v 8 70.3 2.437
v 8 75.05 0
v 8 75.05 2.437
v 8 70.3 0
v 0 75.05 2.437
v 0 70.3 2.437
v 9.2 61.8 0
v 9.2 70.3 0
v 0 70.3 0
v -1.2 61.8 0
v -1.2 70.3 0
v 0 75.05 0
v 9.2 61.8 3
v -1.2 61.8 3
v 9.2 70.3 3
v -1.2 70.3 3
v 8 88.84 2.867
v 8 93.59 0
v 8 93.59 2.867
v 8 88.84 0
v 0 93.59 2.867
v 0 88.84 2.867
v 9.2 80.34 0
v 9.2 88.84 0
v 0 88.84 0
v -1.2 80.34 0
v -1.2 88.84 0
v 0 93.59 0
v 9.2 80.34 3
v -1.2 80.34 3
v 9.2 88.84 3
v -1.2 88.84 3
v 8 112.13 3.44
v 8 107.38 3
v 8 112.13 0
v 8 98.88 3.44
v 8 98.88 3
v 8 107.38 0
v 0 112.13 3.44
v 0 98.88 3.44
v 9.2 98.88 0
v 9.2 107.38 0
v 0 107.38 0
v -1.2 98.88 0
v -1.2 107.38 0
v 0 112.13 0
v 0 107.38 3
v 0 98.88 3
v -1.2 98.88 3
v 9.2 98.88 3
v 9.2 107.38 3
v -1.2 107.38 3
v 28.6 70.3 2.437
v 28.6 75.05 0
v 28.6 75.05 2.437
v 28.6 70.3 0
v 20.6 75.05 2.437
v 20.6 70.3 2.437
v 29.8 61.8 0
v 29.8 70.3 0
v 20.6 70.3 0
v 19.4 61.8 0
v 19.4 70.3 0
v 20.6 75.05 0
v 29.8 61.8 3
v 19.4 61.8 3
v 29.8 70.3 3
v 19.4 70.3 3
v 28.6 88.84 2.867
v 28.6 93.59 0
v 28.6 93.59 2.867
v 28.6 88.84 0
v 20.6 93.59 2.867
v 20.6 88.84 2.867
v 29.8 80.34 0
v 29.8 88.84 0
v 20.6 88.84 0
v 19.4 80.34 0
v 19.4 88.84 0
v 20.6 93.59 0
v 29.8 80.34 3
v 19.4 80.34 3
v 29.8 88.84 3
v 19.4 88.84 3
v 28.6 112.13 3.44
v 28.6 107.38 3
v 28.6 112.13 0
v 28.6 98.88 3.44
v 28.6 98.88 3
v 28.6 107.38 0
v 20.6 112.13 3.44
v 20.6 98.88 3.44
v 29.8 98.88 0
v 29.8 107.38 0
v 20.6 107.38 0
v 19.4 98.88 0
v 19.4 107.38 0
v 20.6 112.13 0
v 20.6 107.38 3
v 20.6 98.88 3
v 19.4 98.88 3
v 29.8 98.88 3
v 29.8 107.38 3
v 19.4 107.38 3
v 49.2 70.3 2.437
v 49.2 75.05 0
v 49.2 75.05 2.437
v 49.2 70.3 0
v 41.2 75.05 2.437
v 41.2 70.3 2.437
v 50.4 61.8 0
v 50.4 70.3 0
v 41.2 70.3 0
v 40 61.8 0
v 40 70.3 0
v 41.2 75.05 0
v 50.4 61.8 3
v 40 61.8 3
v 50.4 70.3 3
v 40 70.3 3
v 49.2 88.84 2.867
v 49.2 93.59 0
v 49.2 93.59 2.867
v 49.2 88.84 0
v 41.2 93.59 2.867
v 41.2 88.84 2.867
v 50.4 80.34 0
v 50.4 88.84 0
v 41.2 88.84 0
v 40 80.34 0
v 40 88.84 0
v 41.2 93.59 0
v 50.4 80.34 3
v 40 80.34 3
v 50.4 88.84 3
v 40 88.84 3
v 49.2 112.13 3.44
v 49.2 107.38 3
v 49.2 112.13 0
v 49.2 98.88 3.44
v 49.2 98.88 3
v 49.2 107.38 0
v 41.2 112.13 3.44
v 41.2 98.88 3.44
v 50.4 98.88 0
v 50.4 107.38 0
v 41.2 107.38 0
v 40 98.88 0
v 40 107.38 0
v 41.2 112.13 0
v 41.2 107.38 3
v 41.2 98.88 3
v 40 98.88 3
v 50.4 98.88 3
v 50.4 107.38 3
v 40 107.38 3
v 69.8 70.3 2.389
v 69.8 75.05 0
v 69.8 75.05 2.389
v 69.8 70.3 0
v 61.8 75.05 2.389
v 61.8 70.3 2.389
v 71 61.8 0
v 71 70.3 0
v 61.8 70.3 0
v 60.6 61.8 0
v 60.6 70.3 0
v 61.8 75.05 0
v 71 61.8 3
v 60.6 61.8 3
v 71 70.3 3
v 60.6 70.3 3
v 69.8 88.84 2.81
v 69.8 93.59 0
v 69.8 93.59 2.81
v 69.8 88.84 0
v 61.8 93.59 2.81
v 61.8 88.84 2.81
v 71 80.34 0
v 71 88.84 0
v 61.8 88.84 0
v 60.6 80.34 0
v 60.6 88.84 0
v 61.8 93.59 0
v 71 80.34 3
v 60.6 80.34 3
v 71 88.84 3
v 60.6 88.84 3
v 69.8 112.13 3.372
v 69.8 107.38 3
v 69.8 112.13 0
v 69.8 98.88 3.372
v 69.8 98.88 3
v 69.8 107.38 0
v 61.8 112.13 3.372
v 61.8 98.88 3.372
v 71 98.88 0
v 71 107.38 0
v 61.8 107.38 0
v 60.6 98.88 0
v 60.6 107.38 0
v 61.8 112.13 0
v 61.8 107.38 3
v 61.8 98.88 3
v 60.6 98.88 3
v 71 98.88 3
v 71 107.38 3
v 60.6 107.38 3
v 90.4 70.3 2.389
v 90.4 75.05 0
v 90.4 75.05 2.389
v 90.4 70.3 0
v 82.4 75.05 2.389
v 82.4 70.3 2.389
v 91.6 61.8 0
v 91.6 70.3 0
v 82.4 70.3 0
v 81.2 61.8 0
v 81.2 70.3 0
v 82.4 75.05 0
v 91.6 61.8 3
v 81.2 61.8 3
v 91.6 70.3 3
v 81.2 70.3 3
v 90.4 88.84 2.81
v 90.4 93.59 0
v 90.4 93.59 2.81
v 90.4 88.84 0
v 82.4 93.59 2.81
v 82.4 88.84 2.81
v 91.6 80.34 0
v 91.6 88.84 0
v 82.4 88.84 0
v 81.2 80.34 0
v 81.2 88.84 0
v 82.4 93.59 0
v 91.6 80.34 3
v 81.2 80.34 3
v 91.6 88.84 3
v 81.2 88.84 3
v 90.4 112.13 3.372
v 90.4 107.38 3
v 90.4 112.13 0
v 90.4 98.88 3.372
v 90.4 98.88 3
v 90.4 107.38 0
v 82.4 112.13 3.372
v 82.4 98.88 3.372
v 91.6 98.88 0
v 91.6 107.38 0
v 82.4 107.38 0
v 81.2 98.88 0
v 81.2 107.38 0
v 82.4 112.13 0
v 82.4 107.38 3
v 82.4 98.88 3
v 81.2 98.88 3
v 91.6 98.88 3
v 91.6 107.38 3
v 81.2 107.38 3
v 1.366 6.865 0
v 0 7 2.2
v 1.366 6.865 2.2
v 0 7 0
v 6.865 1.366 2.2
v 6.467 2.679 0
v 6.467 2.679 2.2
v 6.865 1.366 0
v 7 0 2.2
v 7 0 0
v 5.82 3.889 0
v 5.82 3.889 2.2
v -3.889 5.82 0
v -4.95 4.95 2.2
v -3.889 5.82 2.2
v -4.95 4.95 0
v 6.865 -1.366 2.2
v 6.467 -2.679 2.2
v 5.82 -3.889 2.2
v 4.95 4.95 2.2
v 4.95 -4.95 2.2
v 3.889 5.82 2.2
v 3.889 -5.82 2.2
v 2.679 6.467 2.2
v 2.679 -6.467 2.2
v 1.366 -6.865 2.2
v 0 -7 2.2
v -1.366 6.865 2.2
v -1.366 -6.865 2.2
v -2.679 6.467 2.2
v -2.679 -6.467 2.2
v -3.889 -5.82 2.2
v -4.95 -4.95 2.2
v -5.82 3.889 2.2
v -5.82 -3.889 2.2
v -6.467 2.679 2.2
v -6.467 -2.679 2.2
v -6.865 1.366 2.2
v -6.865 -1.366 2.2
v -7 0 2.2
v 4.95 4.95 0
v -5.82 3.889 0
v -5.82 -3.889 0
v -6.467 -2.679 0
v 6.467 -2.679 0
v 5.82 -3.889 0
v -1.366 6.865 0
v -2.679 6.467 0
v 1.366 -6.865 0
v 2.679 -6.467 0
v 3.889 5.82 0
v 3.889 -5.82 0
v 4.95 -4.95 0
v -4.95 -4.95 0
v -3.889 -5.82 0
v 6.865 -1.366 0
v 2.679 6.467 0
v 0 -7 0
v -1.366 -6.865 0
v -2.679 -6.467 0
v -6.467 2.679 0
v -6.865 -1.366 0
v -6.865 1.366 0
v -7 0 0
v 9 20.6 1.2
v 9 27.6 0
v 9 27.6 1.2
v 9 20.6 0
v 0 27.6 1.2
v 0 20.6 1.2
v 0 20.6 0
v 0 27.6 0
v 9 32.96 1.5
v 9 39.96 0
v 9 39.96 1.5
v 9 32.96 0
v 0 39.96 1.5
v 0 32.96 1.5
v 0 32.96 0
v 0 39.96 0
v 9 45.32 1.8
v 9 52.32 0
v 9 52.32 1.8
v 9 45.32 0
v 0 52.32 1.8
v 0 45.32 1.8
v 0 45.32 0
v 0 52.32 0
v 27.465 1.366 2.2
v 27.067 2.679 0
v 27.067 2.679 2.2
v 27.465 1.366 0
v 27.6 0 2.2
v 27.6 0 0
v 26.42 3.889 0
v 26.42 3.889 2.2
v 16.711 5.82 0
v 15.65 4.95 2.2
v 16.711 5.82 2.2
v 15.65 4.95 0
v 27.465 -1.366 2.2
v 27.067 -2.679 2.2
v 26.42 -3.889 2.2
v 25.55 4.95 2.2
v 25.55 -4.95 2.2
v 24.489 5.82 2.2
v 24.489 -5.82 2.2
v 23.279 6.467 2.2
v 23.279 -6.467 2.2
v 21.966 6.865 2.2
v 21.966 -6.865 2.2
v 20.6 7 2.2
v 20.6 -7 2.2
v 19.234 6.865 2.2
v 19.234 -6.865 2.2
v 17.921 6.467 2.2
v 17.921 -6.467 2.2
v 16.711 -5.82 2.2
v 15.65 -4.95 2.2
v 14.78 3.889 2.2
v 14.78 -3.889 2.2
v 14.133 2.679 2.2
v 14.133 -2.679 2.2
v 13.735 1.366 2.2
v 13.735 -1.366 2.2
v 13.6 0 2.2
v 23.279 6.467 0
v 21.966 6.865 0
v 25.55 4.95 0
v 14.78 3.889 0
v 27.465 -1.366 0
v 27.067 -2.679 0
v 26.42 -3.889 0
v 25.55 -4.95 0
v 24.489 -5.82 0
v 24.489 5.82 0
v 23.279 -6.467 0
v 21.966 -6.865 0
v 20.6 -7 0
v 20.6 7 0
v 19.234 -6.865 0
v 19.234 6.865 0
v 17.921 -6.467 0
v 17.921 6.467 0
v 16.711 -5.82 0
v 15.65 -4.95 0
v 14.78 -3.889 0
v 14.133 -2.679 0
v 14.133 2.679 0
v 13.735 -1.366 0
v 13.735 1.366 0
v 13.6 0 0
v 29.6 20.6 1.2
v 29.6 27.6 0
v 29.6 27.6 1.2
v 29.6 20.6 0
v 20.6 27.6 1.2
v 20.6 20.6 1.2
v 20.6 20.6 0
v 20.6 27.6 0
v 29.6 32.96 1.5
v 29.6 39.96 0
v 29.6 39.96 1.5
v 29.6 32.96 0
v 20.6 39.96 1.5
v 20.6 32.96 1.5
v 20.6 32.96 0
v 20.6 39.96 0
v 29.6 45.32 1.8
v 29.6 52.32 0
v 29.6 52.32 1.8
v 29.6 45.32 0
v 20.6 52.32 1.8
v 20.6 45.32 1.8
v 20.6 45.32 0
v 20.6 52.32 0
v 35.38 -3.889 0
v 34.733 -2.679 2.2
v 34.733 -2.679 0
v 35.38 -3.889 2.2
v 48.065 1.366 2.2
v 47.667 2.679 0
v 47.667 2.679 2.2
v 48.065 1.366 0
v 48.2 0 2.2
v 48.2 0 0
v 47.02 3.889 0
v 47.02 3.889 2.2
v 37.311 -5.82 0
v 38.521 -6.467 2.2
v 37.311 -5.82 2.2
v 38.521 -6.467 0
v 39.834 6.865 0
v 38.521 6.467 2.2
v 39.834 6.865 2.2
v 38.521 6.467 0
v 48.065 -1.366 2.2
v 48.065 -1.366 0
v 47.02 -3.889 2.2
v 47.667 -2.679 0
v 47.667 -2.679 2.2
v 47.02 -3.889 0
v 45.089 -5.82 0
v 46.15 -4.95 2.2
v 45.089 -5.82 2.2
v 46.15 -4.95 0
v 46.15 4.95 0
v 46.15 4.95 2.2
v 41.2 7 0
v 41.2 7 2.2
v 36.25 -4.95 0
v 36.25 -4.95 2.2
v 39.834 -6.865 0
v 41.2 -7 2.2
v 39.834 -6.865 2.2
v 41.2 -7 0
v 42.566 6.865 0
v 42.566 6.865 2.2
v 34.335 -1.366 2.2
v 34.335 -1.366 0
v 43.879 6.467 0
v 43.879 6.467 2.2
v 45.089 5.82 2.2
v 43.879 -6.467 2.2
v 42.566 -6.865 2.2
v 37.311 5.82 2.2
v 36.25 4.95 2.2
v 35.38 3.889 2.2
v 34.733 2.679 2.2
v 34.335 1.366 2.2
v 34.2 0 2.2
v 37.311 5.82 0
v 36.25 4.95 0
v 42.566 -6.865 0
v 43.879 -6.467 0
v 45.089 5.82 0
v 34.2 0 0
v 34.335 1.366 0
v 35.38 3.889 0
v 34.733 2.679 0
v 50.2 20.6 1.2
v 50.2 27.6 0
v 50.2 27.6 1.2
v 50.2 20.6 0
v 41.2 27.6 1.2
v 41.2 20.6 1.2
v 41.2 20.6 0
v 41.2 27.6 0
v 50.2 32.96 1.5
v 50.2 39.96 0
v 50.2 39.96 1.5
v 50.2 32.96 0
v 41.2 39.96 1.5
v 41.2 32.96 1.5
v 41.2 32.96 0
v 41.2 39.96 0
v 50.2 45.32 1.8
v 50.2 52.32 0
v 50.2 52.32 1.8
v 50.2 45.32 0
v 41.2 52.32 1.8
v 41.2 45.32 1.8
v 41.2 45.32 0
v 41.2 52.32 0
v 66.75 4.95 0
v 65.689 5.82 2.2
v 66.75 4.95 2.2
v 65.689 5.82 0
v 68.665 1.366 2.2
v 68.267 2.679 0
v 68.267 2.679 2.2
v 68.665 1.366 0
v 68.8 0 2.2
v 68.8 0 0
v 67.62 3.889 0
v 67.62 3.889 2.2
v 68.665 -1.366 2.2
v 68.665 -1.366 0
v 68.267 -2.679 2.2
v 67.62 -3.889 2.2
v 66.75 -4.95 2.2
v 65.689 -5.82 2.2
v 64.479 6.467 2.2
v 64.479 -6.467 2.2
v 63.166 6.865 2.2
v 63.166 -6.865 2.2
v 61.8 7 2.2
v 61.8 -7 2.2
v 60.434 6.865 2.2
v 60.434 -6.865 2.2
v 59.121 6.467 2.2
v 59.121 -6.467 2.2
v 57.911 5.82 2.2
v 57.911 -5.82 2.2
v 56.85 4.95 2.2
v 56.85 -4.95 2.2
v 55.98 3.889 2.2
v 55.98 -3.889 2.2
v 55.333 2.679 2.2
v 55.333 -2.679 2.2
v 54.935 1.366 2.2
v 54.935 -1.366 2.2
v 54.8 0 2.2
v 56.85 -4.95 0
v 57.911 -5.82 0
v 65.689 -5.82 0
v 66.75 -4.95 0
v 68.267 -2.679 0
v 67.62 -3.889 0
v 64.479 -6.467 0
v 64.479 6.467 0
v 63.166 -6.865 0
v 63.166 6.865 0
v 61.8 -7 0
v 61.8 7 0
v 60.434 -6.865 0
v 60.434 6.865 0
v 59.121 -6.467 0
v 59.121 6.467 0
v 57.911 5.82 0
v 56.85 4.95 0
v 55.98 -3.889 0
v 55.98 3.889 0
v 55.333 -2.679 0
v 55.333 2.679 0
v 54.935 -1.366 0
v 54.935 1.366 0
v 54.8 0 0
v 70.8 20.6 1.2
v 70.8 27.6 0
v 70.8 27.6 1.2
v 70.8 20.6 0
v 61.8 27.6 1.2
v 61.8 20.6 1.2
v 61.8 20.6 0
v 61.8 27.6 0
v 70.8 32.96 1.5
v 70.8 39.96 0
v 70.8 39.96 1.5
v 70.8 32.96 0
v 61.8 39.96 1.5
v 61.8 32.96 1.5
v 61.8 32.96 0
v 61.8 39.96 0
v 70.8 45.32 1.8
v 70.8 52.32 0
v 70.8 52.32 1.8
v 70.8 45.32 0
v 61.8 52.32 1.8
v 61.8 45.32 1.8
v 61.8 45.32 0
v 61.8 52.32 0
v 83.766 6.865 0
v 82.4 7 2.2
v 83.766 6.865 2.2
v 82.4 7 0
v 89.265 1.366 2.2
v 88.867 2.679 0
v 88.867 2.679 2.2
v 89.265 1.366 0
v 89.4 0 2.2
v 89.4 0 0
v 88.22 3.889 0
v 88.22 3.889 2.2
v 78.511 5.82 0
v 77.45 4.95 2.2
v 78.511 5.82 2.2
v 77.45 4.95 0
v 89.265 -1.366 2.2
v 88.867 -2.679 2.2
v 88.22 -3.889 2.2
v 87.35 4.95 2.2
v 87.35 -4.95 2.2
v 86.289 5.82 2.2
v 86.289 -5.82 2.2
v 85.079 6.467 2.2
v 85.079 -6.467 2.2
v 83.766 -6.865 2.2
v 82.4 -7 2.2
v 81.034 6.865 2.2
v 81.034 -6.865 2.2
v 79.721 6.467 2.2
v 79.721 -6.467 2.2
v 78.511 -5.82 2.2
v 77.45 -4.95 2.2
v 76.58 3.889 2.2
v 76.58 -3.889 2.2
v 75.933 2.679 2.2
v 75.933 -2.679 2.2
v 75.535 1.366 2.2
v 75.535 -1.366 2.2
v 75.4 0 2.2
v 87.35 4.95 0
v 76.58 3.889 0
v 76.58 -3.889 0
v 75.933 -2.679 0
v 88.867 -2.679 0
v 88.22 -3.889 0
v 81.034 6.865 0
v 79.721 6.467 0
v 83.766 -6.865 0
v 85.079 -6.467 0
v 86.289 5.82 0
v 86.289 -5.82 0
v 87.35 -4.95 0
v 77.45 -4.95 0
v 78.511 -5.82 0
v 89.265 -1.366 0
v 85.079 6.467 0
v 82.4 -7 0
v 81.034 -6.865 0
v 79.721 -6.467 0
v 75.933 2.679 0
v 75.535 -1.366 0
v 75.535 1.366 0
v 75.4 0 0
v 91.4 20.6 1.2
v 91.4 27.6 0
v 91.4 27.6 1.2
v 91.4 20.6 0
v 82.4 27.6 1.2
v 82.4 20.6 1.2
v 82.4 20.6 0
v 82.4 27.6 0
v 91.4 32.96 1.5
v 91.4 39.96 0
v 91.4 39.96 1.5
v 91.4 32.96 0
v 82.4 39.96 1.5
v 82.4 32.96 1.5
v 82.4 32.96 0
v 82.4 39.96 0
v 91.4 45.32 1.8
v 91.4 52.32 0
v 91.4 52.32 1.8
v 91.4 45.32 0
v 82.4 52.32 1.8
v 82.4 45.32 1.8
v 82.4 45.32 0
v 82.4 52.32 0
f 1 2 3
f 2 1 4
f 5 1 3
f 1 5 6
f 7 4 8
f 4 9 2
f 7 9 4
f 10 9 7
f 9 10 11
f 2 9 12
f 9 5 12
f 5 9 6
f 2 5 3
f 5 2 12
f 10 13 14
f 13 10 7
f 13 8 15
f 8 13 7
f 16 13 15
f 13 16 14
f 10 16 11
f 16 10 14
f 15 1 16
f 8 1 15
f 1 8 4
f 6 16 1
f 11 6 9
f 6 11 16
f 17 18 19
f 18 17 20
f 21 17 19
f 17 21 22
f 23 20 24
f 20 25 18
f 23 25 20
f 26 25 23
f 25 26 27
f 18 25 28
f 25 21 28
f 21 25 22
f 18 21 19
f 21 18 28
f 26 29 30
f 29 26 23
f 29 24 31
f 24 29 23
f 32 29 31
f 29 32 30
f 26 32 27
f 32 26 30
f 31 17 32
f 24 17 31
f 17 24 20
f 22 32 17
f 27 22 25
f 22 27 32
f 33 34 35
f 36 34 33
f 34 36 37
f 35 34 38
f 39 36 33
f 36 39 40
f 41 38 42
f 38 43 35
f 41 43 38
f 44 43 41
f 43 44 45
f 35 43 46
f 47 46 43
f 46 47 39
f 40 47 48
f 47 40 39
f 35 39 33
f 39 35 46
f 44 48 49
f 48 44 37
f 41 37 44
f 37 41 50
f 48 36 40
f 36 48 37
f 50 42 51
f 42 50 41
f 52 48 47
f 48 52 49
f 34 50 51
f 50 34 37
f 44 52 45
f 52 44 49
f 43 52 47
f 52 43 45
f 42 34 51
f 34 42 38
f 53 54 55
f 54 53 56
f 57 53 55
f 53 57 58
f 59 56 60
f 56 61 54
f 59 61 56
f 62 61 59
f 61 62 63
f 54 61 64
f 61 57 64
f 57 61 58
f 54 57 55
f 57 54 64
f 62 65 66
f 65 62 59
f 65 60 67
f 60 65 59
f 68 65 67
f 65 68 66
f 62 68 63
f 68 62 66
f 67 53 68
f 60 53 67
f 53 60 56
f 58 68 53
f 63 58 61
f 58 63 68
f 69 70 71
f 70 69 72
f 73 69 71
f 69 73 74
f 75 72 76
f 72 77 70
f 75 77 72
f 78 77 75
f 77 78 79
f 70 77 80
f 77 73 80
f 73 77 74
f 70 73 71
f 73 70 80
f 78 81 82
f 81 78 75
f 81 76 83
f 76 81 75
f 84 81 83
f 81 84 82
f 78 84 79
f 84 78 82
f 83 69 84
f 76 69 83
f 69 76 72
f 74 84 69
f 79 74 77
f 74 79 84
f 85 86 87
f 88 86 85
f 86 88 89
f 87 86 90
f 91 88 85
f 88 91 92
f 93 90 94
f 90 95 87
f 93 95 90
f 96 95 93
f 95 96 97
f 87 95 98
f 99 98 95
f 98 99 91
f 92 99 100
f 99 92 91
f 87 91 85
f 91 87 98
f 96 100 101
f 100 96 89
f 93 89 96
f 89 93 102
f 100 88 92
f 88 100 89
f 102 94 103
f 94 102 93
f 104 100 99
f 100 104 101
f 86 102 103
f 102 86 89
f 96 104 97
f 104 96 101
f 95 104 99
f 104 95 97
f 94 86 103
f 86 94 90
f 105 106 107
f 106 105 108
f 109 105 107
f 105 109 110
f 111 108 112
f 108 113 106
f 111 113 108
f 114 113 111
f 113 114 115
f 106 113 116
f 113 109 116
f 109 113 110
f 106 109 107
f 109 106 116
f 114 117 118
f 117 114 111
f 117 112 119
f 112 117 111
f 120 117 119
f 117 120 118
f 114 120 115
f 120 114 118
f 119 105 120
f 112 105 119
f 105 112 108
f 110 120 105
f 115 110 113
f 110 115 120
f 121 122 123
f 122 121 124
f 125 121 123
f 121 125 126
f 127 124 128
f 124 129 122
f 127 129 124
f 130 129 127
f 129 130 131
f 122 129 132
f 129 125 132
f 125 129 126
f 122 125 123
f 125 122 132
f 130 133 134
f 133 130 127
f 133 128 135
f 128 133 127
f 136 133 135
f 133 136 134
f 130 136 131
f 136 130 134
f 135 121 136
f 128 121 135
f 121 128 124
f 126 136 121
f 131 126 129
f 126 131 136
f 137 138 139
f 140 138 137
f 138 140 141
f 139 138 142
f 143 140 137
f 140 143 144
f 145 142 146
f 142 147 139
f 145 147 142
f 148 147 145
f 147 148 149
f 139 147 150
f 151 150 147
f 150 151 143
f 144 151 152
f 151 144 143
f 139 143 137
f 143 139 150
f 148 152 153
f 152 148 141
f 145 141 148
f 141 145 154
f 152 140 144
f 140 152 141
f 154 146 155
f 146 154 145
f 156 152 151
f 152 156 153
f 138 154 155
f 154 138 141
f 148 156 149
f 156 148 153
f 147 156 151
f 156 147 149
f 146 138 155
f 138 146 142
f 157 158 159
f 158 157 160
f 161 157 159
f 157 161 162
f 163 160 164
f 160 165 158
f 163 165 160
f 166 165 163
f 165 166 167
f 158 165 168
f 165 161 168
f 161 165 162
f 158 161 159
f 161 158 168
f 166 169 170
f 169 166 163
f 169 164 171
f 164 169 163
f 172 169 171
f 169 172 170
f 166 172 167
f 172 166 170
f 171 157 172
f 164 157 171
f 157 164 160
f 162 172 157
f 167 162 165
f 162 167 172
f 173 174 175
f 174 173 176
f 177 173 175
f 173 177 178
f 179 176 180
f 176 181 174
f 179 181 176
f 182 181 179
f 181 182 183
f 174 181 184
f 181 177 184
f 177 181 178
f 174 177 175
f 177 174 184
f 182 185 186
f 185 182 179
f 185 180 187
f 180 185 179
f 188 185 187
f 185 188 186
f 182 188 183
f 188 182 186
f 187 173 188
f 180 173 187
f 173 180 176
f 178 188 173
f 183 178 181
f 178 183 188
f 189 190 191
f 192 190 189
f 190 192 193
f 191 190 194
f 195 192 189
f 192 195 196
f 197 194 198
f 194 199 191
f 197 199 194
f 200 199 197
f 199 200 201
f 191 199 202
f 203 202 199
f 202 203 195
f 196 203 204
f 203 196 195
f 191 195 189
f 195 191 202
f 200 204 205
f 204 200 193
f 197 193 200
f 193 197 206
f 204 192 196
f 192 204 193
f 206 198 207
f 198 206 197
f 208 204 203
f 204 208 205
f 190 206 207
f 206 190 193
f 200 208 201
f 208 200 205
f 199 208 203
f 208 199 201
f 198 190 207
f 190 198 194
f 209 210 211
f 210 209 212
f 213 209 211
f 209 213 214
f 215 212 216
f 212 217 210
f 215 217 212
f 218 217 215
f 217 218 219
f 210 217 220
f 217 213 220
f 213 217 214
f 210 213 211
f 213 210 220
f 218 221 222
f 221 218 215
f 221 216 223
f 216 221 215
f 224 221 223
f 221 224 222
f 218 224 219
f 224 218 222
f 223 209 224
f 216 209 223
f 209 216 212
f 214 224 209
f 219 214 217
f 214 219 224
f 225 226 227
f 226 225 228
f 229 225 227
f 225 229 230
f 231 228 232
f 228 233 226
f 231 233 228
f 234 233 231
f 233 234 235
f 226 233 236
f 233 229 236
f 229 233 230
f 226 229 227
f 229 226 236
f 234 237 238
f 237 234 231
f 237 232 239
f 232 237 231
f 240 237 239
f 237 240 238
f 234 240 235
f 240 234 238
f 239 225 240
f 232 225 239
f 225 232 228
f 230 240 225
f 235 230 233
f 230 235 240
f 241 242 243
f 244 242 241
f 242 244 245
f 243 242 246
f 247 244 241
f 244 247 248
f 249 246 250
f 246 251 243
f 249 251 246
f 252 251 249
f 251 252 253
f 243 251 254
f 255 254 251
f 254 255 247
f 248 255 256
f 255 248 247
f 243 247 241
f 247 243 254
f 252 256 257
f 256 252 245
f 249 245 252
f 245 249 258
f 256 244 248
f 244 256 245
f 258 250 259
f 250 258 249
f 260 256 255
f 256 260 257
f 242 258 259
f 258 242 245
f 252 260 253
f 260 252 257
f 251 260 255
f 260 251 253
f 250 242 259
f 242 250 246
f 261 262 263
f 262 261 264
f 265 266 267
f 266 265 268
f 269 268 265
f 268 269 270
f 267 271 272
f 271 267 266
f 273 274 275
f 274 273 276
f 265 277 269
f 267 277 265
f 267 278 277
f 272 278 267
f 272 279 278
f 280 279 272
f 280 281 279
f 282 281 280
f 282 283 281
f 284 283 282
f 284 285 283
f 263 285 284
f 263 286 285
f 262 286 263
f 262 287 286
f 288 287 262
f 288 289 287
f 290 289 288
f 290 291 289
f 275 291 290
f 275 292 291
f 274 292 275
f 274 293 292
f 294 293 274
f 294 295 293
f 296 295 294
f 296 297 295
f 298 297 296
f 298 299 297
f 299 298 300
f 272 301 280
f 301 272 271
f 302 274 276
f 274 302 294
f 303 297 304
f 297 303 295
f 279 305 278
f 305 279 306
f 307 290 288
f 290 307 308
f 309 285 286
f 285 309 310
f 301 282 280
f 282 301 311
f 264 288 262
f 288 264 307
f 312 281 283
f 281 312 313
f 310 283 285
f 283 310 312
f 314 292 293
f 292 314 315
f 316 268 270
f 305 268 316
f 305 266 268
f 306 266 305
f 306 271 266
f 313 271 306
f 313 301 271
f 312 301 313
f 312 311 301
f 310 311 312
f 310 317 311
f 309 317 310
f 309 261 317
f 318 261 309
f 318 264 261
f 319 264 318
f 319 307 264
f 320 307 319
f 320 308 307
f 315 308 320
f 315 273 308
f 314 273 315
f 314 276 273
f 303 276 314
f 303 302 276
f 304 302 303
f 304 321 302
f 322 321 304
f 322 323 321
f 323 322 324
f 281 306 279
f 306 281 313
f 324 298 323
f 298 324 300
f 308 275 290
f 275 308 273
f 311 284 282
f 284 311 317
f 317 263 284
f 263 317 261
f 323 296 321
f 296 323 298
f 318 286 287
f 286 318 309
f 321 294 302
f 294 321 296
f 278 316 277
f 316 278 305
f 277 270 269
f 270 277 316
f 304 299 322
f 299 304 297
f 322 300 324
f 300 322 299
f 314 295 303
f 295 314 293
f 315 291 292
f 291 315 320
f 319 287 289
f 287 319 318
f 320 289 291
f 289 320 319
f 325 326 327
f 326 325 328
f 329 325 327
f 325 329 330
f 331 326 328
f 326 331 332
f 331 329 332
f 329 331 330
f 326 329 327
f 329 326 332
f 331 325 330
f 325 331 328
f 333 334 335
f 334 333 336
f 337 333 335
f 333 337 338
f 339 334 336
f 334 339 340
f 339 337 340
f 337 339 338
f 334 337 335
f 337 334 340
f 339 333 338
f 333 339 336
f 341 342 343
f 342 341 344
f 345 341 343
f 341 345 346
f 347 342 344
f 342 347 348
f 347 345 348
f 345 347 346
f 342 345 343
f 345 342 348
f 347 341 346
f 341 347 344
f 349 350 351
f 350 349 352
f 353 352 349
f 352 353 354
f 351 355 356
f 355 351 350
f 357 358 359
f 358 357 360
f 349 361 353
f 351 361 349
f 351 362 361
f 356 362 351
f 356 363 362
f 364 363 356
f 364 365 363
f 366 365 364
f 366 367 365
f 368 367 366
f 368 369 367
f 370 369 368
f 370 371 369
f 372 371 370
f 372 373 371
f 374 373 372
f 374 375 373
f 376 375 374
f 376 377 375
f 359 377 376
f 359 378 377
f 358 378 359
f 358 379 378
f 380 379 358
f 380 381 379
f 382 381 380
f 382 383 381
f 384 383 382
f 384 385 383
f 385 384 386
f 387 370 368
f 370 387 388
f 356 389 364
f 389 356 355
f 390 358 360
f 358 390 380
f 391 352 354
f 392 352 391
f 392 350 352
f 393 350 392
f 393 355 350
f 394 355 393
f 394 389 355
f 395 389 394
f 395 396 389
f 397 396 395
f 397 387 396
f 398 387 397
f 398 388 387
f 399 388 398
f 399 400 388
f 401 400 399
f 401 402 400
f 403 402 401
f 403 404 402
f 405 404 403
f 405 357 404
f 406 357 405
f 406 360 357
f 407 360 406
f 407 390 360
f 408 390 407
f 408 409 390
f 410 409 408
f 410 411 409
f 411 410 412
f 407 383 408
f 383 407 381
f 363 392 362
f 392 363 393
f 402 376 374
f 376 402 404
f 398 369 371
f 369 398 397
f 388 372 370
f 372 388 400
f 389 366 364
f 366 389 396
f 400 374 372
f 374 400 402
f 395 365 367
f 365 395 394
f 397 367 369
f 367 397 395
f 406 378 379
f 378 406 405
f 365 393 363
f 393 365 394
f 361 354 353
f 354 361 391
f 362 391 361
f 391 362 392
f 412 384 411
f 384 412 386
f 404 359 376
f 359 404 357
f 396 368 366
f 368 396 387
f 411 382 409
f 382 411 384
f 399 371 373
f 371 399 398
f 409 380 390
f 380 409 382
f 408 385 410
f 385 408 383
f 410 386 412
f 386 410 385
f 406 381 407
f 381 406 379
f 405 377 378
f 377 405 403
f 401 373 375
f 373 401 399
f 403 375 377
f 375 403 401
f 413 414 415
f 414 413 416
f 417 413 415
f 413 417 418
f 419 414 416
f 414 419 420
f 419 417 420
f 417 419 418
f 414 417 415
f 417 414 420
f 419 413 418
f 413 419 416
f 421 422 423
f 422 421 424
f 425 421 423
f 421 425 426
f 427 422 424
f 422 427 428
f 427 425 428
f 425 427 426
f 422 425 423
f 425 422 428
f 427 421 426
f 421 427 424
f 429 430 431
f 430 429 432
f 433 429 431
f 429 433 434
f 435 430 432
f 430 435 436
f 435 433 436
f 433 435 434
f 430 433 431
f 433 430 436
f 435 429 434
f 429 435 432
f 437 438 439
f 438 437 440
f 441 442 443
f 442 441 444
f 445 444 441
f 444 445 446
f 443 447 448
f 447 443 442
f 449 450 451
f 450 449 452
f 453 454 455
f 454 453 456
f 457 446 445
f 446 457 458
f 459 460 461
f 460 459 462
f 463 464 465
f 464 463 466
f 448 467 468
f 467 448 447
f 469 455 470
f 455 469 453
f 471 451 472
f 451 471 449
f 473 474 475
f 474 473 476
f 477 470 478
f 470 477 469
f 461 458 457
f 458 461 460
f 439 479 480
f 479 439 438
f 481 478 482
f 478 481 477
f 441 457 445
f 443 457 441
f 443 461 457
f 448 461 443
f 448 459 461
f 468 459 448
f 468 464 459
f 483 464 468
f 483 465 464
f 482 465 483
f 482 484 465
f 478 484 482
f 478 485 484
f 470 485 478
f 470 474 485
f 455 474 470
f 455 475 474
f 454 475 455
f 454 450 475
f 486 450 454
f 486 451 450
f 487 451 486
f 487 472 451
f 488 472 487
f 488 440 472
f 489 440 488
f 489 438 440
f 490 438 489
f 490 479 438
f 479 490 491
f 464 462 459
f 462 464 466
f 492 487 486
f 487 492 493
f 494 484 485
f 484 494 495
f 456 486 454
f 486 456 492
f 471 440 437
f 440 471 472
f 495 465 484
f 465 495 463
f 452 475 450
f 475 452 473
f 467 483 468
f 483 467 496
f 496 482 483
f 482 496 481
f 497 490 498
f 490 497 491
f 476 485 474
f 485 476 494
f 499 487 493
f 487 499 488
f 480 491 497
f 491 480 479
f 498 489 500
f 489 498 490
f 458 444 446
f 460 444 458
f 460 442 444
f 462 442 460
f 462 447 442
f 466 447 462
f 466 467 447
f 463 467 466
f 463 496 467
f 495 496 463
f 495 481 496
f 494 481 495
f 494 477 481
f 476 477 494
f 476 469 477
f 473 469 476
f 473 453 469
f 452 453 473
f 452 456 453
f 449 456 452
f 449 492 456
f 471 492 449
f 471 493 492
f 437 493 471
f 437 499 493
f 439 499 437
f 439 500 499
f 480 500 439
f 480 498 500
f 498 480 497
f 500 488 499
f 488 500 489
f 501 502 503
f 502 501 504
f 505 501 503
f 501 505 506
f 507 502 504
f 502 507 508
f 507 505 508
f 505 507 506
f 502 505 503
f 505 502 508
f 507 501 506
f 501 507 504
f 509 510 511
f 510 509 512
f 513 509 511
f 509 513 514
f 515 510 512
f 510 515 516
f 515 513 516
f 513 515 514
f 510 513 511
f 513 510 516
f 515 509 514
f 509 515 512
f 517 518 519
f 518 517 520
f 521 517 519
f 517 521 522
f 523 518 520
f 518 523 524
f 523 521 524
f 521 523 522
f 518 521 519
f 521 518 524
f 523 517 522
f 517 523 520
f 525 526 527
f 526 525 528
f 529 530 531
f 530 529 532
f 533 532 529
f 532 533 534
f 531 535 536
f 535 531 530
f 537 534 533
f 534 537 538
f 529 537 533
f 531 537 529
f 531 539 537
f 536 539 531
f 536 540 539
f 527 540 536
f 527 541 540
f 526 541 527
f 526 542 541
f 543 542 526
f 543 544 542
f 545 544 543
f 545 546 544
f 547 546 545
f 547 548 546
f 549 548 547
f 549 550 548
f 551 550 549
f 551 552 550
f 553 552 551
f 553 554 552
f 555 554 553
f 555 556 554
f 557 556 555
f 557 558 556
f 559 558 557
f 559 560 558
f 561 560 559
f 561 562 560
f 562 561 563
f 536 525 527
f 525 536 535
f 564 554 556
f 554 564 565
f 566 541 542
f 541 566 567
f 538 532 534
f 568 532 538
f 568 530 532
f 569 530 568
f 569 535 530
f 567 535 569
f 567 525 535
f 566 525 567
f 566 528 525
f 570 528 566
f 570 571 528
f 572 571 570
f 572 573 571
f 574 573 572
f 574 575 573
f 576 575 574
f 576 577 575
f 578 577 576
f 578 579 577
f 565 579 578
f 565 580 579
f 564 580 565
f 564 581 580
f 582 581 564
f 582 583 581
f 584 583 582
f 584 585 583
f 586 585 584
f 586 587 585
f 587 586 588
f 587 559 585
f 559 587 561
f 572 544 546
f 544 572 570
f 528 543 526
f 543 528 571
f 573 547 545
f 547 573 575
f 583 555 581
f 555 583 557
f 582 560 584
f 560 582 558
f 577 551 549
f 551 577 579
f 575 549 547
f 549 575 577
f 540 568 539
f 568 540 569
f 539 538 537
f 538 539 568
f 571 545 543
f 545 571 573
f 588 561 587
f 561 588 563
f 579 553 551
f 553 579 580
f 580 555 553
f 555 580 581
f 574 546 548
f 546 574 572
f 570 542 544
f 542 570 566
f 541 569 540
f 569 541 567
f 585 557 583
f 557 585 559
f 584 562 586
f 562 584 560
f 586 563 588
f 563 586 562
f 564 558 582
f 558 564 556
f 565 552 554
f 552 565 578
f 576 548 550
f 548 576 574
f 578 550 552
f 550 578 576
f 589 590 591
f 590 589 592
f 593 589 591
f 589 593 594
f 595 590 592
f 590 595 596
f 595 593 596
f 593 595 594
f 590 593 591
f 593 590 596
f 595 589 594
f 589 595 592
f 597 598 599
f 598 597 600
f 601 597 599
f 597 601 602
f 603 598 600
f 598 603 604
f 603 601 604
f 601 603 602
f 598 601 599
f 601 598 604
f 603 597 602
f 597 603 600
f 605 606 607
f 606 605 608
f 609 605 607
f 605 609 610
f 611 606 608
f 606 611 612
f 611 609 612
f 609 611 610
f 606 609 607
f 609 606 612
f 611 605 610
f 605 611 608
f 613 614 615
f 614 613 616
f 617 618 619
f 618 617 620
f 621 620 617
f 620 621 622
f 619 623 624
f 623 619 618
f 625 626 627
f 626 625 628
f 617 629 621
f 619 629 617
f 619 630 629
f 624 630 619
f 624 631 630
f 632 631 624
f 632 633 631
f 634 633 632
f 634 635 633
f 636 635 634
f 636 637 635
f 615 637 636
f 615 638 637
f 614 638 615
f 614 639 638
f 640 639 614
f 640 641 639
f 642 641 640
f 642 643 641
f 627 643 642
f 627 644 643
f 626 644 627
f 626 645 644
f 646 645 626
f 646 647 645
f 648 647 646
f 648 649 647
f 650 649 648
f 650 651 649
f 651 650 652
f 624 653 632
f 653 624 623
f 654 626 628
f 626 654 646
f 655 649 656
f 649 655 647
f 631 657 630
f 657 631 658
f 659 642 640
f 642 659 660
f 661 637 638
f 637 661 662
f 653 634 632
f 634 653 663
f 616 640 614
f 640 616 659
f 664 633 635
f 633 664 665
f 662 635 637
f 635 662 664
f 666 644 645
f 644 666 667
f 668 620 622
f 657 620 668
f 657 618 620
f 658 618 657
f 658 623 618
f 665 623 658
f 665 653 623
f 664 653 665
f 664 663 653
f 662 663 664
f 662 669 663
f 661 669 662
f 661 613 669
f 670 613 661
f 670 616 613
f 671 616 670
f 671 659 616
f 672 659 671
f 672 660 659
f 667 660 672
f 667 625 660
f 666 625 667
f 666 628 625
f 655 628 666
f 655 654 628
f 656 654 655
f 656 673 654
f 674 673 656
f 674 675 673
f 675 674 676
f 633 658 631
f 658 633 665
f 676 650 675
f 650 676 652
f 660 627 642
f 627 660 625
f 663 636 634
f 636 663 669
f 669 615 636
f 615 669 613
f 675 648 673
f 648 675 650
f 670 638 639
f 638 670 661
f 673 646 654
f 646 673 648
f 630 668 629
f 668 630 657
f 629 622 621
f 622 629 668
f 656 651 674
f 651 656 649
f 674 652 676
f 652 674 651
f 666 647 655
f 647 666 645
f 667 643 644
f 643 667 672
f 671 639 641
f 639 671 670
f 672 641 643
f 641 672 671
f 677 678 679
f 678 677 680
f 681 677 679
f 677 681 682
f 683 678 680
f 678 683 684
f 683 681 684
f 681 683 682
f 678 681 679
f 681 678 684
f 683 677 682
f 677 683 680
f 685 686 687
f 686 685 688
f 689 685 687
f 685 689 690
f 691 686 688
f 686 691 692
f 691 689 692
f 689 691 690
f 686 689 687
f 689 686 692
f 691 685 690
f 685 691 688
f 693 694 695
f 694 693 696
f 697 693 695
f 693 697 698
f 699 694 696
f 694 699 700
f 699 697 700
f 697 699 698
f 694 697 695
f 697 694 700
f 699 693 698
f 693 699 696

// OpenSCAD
    // pad disc, hole 0
    translate([0.000, 0, 0]) cylinder(d=14.000, h=2.200, $fn=32);
    // regulation bumper, hole 0, 1.200 mm shim
    translate([0.000, 20.600, 0])
        cube([9.000, 7.000, 1.200], center=false);
    // regulation bumper, hole 0, 1.500 mm shim
    translate([0.000, 32.960, 0])
        cube([9.000, 7.000, 1.500], center=false);
    // regulation bumper, hole 0, 1.800 mm shim
    translate([0.000, 45.320, 0])
        cube([9.000, 7.000, 1.800], center=false);
    // leaf spring, hole 0, 2.437 mm tuning rung
    translate([0.000, 61.800, 0]) {
        cube([8.000, 13.250, 2.437], center=false);
        translate([-1.200, 0, 0]) cube([10.400, 8.500, 3.000], center=false);
    }
    // leaf spring, hole 0, 2.867 mm tuning rung
    translate([0.000, 80.340, 0]) {
        cube([8.000, 13.250, 2.867], center=false);
        translate([-1.200, 0, 0]) cube([10.400, 8.500, 3.000], center=false);
    }
    // leaf spring, hole 0, 3.440 mm tuning rung
    translate([0.000, 98.880, 0]) {
        cube([8.000, 13.250, 3.440], center=false);
        translate([-1.200, 0, 0]) cube([10.400, 8.500, 3.000], center=false);
    }
    // pad disc, hole 1
    translate([20.600, 0, 0]) cylinder(d=14.000, h=2.200, $fn=32);
    // regulation bumper, hole 1, 1.200 mm shim
    translate([20.600, 20.600, 0])
        cube([9.000, 7.000, 1.200], center=false);
    // regulation bumper, hole 1, 1.500 mm shim
    translate([20.600, 32.960, 0])
        cube([9.000, 7.000, 1.500], center=false);
    // regulation bumper, hole 1, 1.800 mm shim
    translate([20.600, 45.320, 0])
        cube([9.000, 7.000, 1.800], center=false);
    // leaf spring, hole 1, 2.437 mm tuning rung
    translate([20.600, 61.800, 0]) {
        cube([8.000, 13.250, 2.437], center=false);
        translate([-1.200, 0, 0]) cube([10.400, 8.500, 3.000], center=false);
    }
    // leaf spring, hole 1, 2.867 mm tuning rung
    translate([20.600, 80.340, 0]) {
        cube([8.000, 13.250, 2.867], center=false);
        translate([-1.200, 0, 0]) cube([10.400, 8.500, 3.000], center=false);
    }
    // leaf spring, hole 1, 3.440 mm tuning rung
    translate([20.600, 98.880, 0]) {
        cube([8.000, 13.250, 3.440], center=false);
        translate([-1.200, 0, 0]) cube([10.400, 8.500, 3.000], center=false);
    }
    // pad disc, hole 2
    translate([41.200, 0, 0]) cylinder(d=14.000, h=2.200, $fn=32);
    // regulation bumper, hole 2, 1.200 mm shim
    translate([41.200, 20.600, 0])
        cube([9.000, 7.000, 1.200], center=false);
    // regulation bumper, hole 2, 1.500 mm shim
    translate([41.200, 32.960, 0])
        cube([9.000, 7.000, 1.500], center=false);
    // regulation bumper, hole 2, 1.800 mm shim
    translate([41.200, 45.320, 0])
        cube([9.000, 7.000, 1.800], center=false);
    // leaf spring, hole 2, 2.437 mm tuning rung
    translate([41.200, 61.800, 0]) {
        cube([8.000, 13.250, 2.437], center=false);
        translate([-1.200, 0, 0]) cube([10.400, 8.500, 3.000], center=false);
    }
    // leaf spring, hole 2, 2.867 mm tuning rung
    translate([41.200, 80.340, 0]) {
        cube([8.000, 13.250, 2.867], center=false);
        translate([-1.200, 0, 0]) cube([10.400, 8.500, 3.000], center=false);
    }
    // leaf spring, hole 2, 3.440 mm tuning rung
    translate([41.200, 98.880, 0]) {
        cube([8.000, 13.250, 3.440], center=false);
        translate([-1.200, 0, 0]) cube([10.400, 8.500, 3.000], center=false);
    }
    // pad disc, hole 3
    translate([61.800, 0, 0]) cylinder(d=14.000, h=2.200, $fn=32);
    // regulation bumper, hole 3, 1.200 mm shim
    translate([61.800, 20.600, 0])
        cube([9.000, 7.000, 1.200], center=false);
    // regulation bumper, hole 3, 1.500 mm shim
    translate([61.800, 32.960, 0])
        cube([9.000, 7.000, 1.500], center=false);
    // regulation bumper, hole 3, 1.800 mm shim
    translate([61.800, 45.320, 0])
        cube([9.000, 7.000, 1.800], center=false);
    // leaf spring, hole 3, 2.389 mm tuning rung
    translate([61.800, 61.800, 0]) {
        cube([8.000, 13.250, 2.389], center=false);
        translate([-1.200, 0, 0]) cube([10.400, 8.500, 3.000], center=false);
    }
    // leaf spring, hole 3, 2.810 mm tuning rung
    translate([61.800, 80.340, 0]) {
        cube([8.000, 13.250, 2.810], center=false);
        translate([-1.200, 0, 0]) cube([10.400, 8.500, 3.000], center=false);
    }
    // leaf spring, hole 3, 3.372 mm tuning rung
    translate([61.800, 98.880, 0]) {
        cube([8.000, 13.250, 3.372], center=false);
        translate([-1.200, 0, 0]) cube([10.400, 8.500, 3.000], center=false);
    }
    // pad disc, hole 4
    translate([82.400, 0, 0]) cylinder(d=14.000, h=2.200, $fn=32);
    // regulation bumper, hole 4, 1.200 mm shim
    translate([82.400, 20.600, 0])
        cube([9.000, 7.000, 1.200], center=false);
    // regulation bumper, hole 4, 1.500 mm shim
    translate([82.400, 32.960, 0])
        cube([9.000, 7.000, 1.500], center=false);
    // regulation bumper, hole 4, 1.800 mm shim
    translate([82.400, 45.320, 0])
        cube([9.000, 7.000, 1.800], center=false);
    // leaf spring, hole 4, 2.389 mm tuning rung
    translate([82.400, 61.800, 0]) {
        cube([8.000, 13.250, 2.389], center=false);
        translate([-1.200, 0, 0]) cube([10.400, 8.500, 3.000], center=false);
    }
    // leaf spring, hole 4, 2.810 mm tuning rung
    translate([82.400, 80.340, 0]) {
        cube([8.000, 13.250, 2.810], center=false);
        translate([-1.200, 0, 0]) cube([10.400, 8.500, 3.000], center=false);
    }
    // leaf spring, hole 4, 3.372 mm tuning rung
    translate([82.400, 98.880, 0]) {
        cube([8.000, 13.250, 3.372], center=false);
        translate([-1.200, 0, 0]) cube([10.400, 8.500, 3.000], center=false);
    }
